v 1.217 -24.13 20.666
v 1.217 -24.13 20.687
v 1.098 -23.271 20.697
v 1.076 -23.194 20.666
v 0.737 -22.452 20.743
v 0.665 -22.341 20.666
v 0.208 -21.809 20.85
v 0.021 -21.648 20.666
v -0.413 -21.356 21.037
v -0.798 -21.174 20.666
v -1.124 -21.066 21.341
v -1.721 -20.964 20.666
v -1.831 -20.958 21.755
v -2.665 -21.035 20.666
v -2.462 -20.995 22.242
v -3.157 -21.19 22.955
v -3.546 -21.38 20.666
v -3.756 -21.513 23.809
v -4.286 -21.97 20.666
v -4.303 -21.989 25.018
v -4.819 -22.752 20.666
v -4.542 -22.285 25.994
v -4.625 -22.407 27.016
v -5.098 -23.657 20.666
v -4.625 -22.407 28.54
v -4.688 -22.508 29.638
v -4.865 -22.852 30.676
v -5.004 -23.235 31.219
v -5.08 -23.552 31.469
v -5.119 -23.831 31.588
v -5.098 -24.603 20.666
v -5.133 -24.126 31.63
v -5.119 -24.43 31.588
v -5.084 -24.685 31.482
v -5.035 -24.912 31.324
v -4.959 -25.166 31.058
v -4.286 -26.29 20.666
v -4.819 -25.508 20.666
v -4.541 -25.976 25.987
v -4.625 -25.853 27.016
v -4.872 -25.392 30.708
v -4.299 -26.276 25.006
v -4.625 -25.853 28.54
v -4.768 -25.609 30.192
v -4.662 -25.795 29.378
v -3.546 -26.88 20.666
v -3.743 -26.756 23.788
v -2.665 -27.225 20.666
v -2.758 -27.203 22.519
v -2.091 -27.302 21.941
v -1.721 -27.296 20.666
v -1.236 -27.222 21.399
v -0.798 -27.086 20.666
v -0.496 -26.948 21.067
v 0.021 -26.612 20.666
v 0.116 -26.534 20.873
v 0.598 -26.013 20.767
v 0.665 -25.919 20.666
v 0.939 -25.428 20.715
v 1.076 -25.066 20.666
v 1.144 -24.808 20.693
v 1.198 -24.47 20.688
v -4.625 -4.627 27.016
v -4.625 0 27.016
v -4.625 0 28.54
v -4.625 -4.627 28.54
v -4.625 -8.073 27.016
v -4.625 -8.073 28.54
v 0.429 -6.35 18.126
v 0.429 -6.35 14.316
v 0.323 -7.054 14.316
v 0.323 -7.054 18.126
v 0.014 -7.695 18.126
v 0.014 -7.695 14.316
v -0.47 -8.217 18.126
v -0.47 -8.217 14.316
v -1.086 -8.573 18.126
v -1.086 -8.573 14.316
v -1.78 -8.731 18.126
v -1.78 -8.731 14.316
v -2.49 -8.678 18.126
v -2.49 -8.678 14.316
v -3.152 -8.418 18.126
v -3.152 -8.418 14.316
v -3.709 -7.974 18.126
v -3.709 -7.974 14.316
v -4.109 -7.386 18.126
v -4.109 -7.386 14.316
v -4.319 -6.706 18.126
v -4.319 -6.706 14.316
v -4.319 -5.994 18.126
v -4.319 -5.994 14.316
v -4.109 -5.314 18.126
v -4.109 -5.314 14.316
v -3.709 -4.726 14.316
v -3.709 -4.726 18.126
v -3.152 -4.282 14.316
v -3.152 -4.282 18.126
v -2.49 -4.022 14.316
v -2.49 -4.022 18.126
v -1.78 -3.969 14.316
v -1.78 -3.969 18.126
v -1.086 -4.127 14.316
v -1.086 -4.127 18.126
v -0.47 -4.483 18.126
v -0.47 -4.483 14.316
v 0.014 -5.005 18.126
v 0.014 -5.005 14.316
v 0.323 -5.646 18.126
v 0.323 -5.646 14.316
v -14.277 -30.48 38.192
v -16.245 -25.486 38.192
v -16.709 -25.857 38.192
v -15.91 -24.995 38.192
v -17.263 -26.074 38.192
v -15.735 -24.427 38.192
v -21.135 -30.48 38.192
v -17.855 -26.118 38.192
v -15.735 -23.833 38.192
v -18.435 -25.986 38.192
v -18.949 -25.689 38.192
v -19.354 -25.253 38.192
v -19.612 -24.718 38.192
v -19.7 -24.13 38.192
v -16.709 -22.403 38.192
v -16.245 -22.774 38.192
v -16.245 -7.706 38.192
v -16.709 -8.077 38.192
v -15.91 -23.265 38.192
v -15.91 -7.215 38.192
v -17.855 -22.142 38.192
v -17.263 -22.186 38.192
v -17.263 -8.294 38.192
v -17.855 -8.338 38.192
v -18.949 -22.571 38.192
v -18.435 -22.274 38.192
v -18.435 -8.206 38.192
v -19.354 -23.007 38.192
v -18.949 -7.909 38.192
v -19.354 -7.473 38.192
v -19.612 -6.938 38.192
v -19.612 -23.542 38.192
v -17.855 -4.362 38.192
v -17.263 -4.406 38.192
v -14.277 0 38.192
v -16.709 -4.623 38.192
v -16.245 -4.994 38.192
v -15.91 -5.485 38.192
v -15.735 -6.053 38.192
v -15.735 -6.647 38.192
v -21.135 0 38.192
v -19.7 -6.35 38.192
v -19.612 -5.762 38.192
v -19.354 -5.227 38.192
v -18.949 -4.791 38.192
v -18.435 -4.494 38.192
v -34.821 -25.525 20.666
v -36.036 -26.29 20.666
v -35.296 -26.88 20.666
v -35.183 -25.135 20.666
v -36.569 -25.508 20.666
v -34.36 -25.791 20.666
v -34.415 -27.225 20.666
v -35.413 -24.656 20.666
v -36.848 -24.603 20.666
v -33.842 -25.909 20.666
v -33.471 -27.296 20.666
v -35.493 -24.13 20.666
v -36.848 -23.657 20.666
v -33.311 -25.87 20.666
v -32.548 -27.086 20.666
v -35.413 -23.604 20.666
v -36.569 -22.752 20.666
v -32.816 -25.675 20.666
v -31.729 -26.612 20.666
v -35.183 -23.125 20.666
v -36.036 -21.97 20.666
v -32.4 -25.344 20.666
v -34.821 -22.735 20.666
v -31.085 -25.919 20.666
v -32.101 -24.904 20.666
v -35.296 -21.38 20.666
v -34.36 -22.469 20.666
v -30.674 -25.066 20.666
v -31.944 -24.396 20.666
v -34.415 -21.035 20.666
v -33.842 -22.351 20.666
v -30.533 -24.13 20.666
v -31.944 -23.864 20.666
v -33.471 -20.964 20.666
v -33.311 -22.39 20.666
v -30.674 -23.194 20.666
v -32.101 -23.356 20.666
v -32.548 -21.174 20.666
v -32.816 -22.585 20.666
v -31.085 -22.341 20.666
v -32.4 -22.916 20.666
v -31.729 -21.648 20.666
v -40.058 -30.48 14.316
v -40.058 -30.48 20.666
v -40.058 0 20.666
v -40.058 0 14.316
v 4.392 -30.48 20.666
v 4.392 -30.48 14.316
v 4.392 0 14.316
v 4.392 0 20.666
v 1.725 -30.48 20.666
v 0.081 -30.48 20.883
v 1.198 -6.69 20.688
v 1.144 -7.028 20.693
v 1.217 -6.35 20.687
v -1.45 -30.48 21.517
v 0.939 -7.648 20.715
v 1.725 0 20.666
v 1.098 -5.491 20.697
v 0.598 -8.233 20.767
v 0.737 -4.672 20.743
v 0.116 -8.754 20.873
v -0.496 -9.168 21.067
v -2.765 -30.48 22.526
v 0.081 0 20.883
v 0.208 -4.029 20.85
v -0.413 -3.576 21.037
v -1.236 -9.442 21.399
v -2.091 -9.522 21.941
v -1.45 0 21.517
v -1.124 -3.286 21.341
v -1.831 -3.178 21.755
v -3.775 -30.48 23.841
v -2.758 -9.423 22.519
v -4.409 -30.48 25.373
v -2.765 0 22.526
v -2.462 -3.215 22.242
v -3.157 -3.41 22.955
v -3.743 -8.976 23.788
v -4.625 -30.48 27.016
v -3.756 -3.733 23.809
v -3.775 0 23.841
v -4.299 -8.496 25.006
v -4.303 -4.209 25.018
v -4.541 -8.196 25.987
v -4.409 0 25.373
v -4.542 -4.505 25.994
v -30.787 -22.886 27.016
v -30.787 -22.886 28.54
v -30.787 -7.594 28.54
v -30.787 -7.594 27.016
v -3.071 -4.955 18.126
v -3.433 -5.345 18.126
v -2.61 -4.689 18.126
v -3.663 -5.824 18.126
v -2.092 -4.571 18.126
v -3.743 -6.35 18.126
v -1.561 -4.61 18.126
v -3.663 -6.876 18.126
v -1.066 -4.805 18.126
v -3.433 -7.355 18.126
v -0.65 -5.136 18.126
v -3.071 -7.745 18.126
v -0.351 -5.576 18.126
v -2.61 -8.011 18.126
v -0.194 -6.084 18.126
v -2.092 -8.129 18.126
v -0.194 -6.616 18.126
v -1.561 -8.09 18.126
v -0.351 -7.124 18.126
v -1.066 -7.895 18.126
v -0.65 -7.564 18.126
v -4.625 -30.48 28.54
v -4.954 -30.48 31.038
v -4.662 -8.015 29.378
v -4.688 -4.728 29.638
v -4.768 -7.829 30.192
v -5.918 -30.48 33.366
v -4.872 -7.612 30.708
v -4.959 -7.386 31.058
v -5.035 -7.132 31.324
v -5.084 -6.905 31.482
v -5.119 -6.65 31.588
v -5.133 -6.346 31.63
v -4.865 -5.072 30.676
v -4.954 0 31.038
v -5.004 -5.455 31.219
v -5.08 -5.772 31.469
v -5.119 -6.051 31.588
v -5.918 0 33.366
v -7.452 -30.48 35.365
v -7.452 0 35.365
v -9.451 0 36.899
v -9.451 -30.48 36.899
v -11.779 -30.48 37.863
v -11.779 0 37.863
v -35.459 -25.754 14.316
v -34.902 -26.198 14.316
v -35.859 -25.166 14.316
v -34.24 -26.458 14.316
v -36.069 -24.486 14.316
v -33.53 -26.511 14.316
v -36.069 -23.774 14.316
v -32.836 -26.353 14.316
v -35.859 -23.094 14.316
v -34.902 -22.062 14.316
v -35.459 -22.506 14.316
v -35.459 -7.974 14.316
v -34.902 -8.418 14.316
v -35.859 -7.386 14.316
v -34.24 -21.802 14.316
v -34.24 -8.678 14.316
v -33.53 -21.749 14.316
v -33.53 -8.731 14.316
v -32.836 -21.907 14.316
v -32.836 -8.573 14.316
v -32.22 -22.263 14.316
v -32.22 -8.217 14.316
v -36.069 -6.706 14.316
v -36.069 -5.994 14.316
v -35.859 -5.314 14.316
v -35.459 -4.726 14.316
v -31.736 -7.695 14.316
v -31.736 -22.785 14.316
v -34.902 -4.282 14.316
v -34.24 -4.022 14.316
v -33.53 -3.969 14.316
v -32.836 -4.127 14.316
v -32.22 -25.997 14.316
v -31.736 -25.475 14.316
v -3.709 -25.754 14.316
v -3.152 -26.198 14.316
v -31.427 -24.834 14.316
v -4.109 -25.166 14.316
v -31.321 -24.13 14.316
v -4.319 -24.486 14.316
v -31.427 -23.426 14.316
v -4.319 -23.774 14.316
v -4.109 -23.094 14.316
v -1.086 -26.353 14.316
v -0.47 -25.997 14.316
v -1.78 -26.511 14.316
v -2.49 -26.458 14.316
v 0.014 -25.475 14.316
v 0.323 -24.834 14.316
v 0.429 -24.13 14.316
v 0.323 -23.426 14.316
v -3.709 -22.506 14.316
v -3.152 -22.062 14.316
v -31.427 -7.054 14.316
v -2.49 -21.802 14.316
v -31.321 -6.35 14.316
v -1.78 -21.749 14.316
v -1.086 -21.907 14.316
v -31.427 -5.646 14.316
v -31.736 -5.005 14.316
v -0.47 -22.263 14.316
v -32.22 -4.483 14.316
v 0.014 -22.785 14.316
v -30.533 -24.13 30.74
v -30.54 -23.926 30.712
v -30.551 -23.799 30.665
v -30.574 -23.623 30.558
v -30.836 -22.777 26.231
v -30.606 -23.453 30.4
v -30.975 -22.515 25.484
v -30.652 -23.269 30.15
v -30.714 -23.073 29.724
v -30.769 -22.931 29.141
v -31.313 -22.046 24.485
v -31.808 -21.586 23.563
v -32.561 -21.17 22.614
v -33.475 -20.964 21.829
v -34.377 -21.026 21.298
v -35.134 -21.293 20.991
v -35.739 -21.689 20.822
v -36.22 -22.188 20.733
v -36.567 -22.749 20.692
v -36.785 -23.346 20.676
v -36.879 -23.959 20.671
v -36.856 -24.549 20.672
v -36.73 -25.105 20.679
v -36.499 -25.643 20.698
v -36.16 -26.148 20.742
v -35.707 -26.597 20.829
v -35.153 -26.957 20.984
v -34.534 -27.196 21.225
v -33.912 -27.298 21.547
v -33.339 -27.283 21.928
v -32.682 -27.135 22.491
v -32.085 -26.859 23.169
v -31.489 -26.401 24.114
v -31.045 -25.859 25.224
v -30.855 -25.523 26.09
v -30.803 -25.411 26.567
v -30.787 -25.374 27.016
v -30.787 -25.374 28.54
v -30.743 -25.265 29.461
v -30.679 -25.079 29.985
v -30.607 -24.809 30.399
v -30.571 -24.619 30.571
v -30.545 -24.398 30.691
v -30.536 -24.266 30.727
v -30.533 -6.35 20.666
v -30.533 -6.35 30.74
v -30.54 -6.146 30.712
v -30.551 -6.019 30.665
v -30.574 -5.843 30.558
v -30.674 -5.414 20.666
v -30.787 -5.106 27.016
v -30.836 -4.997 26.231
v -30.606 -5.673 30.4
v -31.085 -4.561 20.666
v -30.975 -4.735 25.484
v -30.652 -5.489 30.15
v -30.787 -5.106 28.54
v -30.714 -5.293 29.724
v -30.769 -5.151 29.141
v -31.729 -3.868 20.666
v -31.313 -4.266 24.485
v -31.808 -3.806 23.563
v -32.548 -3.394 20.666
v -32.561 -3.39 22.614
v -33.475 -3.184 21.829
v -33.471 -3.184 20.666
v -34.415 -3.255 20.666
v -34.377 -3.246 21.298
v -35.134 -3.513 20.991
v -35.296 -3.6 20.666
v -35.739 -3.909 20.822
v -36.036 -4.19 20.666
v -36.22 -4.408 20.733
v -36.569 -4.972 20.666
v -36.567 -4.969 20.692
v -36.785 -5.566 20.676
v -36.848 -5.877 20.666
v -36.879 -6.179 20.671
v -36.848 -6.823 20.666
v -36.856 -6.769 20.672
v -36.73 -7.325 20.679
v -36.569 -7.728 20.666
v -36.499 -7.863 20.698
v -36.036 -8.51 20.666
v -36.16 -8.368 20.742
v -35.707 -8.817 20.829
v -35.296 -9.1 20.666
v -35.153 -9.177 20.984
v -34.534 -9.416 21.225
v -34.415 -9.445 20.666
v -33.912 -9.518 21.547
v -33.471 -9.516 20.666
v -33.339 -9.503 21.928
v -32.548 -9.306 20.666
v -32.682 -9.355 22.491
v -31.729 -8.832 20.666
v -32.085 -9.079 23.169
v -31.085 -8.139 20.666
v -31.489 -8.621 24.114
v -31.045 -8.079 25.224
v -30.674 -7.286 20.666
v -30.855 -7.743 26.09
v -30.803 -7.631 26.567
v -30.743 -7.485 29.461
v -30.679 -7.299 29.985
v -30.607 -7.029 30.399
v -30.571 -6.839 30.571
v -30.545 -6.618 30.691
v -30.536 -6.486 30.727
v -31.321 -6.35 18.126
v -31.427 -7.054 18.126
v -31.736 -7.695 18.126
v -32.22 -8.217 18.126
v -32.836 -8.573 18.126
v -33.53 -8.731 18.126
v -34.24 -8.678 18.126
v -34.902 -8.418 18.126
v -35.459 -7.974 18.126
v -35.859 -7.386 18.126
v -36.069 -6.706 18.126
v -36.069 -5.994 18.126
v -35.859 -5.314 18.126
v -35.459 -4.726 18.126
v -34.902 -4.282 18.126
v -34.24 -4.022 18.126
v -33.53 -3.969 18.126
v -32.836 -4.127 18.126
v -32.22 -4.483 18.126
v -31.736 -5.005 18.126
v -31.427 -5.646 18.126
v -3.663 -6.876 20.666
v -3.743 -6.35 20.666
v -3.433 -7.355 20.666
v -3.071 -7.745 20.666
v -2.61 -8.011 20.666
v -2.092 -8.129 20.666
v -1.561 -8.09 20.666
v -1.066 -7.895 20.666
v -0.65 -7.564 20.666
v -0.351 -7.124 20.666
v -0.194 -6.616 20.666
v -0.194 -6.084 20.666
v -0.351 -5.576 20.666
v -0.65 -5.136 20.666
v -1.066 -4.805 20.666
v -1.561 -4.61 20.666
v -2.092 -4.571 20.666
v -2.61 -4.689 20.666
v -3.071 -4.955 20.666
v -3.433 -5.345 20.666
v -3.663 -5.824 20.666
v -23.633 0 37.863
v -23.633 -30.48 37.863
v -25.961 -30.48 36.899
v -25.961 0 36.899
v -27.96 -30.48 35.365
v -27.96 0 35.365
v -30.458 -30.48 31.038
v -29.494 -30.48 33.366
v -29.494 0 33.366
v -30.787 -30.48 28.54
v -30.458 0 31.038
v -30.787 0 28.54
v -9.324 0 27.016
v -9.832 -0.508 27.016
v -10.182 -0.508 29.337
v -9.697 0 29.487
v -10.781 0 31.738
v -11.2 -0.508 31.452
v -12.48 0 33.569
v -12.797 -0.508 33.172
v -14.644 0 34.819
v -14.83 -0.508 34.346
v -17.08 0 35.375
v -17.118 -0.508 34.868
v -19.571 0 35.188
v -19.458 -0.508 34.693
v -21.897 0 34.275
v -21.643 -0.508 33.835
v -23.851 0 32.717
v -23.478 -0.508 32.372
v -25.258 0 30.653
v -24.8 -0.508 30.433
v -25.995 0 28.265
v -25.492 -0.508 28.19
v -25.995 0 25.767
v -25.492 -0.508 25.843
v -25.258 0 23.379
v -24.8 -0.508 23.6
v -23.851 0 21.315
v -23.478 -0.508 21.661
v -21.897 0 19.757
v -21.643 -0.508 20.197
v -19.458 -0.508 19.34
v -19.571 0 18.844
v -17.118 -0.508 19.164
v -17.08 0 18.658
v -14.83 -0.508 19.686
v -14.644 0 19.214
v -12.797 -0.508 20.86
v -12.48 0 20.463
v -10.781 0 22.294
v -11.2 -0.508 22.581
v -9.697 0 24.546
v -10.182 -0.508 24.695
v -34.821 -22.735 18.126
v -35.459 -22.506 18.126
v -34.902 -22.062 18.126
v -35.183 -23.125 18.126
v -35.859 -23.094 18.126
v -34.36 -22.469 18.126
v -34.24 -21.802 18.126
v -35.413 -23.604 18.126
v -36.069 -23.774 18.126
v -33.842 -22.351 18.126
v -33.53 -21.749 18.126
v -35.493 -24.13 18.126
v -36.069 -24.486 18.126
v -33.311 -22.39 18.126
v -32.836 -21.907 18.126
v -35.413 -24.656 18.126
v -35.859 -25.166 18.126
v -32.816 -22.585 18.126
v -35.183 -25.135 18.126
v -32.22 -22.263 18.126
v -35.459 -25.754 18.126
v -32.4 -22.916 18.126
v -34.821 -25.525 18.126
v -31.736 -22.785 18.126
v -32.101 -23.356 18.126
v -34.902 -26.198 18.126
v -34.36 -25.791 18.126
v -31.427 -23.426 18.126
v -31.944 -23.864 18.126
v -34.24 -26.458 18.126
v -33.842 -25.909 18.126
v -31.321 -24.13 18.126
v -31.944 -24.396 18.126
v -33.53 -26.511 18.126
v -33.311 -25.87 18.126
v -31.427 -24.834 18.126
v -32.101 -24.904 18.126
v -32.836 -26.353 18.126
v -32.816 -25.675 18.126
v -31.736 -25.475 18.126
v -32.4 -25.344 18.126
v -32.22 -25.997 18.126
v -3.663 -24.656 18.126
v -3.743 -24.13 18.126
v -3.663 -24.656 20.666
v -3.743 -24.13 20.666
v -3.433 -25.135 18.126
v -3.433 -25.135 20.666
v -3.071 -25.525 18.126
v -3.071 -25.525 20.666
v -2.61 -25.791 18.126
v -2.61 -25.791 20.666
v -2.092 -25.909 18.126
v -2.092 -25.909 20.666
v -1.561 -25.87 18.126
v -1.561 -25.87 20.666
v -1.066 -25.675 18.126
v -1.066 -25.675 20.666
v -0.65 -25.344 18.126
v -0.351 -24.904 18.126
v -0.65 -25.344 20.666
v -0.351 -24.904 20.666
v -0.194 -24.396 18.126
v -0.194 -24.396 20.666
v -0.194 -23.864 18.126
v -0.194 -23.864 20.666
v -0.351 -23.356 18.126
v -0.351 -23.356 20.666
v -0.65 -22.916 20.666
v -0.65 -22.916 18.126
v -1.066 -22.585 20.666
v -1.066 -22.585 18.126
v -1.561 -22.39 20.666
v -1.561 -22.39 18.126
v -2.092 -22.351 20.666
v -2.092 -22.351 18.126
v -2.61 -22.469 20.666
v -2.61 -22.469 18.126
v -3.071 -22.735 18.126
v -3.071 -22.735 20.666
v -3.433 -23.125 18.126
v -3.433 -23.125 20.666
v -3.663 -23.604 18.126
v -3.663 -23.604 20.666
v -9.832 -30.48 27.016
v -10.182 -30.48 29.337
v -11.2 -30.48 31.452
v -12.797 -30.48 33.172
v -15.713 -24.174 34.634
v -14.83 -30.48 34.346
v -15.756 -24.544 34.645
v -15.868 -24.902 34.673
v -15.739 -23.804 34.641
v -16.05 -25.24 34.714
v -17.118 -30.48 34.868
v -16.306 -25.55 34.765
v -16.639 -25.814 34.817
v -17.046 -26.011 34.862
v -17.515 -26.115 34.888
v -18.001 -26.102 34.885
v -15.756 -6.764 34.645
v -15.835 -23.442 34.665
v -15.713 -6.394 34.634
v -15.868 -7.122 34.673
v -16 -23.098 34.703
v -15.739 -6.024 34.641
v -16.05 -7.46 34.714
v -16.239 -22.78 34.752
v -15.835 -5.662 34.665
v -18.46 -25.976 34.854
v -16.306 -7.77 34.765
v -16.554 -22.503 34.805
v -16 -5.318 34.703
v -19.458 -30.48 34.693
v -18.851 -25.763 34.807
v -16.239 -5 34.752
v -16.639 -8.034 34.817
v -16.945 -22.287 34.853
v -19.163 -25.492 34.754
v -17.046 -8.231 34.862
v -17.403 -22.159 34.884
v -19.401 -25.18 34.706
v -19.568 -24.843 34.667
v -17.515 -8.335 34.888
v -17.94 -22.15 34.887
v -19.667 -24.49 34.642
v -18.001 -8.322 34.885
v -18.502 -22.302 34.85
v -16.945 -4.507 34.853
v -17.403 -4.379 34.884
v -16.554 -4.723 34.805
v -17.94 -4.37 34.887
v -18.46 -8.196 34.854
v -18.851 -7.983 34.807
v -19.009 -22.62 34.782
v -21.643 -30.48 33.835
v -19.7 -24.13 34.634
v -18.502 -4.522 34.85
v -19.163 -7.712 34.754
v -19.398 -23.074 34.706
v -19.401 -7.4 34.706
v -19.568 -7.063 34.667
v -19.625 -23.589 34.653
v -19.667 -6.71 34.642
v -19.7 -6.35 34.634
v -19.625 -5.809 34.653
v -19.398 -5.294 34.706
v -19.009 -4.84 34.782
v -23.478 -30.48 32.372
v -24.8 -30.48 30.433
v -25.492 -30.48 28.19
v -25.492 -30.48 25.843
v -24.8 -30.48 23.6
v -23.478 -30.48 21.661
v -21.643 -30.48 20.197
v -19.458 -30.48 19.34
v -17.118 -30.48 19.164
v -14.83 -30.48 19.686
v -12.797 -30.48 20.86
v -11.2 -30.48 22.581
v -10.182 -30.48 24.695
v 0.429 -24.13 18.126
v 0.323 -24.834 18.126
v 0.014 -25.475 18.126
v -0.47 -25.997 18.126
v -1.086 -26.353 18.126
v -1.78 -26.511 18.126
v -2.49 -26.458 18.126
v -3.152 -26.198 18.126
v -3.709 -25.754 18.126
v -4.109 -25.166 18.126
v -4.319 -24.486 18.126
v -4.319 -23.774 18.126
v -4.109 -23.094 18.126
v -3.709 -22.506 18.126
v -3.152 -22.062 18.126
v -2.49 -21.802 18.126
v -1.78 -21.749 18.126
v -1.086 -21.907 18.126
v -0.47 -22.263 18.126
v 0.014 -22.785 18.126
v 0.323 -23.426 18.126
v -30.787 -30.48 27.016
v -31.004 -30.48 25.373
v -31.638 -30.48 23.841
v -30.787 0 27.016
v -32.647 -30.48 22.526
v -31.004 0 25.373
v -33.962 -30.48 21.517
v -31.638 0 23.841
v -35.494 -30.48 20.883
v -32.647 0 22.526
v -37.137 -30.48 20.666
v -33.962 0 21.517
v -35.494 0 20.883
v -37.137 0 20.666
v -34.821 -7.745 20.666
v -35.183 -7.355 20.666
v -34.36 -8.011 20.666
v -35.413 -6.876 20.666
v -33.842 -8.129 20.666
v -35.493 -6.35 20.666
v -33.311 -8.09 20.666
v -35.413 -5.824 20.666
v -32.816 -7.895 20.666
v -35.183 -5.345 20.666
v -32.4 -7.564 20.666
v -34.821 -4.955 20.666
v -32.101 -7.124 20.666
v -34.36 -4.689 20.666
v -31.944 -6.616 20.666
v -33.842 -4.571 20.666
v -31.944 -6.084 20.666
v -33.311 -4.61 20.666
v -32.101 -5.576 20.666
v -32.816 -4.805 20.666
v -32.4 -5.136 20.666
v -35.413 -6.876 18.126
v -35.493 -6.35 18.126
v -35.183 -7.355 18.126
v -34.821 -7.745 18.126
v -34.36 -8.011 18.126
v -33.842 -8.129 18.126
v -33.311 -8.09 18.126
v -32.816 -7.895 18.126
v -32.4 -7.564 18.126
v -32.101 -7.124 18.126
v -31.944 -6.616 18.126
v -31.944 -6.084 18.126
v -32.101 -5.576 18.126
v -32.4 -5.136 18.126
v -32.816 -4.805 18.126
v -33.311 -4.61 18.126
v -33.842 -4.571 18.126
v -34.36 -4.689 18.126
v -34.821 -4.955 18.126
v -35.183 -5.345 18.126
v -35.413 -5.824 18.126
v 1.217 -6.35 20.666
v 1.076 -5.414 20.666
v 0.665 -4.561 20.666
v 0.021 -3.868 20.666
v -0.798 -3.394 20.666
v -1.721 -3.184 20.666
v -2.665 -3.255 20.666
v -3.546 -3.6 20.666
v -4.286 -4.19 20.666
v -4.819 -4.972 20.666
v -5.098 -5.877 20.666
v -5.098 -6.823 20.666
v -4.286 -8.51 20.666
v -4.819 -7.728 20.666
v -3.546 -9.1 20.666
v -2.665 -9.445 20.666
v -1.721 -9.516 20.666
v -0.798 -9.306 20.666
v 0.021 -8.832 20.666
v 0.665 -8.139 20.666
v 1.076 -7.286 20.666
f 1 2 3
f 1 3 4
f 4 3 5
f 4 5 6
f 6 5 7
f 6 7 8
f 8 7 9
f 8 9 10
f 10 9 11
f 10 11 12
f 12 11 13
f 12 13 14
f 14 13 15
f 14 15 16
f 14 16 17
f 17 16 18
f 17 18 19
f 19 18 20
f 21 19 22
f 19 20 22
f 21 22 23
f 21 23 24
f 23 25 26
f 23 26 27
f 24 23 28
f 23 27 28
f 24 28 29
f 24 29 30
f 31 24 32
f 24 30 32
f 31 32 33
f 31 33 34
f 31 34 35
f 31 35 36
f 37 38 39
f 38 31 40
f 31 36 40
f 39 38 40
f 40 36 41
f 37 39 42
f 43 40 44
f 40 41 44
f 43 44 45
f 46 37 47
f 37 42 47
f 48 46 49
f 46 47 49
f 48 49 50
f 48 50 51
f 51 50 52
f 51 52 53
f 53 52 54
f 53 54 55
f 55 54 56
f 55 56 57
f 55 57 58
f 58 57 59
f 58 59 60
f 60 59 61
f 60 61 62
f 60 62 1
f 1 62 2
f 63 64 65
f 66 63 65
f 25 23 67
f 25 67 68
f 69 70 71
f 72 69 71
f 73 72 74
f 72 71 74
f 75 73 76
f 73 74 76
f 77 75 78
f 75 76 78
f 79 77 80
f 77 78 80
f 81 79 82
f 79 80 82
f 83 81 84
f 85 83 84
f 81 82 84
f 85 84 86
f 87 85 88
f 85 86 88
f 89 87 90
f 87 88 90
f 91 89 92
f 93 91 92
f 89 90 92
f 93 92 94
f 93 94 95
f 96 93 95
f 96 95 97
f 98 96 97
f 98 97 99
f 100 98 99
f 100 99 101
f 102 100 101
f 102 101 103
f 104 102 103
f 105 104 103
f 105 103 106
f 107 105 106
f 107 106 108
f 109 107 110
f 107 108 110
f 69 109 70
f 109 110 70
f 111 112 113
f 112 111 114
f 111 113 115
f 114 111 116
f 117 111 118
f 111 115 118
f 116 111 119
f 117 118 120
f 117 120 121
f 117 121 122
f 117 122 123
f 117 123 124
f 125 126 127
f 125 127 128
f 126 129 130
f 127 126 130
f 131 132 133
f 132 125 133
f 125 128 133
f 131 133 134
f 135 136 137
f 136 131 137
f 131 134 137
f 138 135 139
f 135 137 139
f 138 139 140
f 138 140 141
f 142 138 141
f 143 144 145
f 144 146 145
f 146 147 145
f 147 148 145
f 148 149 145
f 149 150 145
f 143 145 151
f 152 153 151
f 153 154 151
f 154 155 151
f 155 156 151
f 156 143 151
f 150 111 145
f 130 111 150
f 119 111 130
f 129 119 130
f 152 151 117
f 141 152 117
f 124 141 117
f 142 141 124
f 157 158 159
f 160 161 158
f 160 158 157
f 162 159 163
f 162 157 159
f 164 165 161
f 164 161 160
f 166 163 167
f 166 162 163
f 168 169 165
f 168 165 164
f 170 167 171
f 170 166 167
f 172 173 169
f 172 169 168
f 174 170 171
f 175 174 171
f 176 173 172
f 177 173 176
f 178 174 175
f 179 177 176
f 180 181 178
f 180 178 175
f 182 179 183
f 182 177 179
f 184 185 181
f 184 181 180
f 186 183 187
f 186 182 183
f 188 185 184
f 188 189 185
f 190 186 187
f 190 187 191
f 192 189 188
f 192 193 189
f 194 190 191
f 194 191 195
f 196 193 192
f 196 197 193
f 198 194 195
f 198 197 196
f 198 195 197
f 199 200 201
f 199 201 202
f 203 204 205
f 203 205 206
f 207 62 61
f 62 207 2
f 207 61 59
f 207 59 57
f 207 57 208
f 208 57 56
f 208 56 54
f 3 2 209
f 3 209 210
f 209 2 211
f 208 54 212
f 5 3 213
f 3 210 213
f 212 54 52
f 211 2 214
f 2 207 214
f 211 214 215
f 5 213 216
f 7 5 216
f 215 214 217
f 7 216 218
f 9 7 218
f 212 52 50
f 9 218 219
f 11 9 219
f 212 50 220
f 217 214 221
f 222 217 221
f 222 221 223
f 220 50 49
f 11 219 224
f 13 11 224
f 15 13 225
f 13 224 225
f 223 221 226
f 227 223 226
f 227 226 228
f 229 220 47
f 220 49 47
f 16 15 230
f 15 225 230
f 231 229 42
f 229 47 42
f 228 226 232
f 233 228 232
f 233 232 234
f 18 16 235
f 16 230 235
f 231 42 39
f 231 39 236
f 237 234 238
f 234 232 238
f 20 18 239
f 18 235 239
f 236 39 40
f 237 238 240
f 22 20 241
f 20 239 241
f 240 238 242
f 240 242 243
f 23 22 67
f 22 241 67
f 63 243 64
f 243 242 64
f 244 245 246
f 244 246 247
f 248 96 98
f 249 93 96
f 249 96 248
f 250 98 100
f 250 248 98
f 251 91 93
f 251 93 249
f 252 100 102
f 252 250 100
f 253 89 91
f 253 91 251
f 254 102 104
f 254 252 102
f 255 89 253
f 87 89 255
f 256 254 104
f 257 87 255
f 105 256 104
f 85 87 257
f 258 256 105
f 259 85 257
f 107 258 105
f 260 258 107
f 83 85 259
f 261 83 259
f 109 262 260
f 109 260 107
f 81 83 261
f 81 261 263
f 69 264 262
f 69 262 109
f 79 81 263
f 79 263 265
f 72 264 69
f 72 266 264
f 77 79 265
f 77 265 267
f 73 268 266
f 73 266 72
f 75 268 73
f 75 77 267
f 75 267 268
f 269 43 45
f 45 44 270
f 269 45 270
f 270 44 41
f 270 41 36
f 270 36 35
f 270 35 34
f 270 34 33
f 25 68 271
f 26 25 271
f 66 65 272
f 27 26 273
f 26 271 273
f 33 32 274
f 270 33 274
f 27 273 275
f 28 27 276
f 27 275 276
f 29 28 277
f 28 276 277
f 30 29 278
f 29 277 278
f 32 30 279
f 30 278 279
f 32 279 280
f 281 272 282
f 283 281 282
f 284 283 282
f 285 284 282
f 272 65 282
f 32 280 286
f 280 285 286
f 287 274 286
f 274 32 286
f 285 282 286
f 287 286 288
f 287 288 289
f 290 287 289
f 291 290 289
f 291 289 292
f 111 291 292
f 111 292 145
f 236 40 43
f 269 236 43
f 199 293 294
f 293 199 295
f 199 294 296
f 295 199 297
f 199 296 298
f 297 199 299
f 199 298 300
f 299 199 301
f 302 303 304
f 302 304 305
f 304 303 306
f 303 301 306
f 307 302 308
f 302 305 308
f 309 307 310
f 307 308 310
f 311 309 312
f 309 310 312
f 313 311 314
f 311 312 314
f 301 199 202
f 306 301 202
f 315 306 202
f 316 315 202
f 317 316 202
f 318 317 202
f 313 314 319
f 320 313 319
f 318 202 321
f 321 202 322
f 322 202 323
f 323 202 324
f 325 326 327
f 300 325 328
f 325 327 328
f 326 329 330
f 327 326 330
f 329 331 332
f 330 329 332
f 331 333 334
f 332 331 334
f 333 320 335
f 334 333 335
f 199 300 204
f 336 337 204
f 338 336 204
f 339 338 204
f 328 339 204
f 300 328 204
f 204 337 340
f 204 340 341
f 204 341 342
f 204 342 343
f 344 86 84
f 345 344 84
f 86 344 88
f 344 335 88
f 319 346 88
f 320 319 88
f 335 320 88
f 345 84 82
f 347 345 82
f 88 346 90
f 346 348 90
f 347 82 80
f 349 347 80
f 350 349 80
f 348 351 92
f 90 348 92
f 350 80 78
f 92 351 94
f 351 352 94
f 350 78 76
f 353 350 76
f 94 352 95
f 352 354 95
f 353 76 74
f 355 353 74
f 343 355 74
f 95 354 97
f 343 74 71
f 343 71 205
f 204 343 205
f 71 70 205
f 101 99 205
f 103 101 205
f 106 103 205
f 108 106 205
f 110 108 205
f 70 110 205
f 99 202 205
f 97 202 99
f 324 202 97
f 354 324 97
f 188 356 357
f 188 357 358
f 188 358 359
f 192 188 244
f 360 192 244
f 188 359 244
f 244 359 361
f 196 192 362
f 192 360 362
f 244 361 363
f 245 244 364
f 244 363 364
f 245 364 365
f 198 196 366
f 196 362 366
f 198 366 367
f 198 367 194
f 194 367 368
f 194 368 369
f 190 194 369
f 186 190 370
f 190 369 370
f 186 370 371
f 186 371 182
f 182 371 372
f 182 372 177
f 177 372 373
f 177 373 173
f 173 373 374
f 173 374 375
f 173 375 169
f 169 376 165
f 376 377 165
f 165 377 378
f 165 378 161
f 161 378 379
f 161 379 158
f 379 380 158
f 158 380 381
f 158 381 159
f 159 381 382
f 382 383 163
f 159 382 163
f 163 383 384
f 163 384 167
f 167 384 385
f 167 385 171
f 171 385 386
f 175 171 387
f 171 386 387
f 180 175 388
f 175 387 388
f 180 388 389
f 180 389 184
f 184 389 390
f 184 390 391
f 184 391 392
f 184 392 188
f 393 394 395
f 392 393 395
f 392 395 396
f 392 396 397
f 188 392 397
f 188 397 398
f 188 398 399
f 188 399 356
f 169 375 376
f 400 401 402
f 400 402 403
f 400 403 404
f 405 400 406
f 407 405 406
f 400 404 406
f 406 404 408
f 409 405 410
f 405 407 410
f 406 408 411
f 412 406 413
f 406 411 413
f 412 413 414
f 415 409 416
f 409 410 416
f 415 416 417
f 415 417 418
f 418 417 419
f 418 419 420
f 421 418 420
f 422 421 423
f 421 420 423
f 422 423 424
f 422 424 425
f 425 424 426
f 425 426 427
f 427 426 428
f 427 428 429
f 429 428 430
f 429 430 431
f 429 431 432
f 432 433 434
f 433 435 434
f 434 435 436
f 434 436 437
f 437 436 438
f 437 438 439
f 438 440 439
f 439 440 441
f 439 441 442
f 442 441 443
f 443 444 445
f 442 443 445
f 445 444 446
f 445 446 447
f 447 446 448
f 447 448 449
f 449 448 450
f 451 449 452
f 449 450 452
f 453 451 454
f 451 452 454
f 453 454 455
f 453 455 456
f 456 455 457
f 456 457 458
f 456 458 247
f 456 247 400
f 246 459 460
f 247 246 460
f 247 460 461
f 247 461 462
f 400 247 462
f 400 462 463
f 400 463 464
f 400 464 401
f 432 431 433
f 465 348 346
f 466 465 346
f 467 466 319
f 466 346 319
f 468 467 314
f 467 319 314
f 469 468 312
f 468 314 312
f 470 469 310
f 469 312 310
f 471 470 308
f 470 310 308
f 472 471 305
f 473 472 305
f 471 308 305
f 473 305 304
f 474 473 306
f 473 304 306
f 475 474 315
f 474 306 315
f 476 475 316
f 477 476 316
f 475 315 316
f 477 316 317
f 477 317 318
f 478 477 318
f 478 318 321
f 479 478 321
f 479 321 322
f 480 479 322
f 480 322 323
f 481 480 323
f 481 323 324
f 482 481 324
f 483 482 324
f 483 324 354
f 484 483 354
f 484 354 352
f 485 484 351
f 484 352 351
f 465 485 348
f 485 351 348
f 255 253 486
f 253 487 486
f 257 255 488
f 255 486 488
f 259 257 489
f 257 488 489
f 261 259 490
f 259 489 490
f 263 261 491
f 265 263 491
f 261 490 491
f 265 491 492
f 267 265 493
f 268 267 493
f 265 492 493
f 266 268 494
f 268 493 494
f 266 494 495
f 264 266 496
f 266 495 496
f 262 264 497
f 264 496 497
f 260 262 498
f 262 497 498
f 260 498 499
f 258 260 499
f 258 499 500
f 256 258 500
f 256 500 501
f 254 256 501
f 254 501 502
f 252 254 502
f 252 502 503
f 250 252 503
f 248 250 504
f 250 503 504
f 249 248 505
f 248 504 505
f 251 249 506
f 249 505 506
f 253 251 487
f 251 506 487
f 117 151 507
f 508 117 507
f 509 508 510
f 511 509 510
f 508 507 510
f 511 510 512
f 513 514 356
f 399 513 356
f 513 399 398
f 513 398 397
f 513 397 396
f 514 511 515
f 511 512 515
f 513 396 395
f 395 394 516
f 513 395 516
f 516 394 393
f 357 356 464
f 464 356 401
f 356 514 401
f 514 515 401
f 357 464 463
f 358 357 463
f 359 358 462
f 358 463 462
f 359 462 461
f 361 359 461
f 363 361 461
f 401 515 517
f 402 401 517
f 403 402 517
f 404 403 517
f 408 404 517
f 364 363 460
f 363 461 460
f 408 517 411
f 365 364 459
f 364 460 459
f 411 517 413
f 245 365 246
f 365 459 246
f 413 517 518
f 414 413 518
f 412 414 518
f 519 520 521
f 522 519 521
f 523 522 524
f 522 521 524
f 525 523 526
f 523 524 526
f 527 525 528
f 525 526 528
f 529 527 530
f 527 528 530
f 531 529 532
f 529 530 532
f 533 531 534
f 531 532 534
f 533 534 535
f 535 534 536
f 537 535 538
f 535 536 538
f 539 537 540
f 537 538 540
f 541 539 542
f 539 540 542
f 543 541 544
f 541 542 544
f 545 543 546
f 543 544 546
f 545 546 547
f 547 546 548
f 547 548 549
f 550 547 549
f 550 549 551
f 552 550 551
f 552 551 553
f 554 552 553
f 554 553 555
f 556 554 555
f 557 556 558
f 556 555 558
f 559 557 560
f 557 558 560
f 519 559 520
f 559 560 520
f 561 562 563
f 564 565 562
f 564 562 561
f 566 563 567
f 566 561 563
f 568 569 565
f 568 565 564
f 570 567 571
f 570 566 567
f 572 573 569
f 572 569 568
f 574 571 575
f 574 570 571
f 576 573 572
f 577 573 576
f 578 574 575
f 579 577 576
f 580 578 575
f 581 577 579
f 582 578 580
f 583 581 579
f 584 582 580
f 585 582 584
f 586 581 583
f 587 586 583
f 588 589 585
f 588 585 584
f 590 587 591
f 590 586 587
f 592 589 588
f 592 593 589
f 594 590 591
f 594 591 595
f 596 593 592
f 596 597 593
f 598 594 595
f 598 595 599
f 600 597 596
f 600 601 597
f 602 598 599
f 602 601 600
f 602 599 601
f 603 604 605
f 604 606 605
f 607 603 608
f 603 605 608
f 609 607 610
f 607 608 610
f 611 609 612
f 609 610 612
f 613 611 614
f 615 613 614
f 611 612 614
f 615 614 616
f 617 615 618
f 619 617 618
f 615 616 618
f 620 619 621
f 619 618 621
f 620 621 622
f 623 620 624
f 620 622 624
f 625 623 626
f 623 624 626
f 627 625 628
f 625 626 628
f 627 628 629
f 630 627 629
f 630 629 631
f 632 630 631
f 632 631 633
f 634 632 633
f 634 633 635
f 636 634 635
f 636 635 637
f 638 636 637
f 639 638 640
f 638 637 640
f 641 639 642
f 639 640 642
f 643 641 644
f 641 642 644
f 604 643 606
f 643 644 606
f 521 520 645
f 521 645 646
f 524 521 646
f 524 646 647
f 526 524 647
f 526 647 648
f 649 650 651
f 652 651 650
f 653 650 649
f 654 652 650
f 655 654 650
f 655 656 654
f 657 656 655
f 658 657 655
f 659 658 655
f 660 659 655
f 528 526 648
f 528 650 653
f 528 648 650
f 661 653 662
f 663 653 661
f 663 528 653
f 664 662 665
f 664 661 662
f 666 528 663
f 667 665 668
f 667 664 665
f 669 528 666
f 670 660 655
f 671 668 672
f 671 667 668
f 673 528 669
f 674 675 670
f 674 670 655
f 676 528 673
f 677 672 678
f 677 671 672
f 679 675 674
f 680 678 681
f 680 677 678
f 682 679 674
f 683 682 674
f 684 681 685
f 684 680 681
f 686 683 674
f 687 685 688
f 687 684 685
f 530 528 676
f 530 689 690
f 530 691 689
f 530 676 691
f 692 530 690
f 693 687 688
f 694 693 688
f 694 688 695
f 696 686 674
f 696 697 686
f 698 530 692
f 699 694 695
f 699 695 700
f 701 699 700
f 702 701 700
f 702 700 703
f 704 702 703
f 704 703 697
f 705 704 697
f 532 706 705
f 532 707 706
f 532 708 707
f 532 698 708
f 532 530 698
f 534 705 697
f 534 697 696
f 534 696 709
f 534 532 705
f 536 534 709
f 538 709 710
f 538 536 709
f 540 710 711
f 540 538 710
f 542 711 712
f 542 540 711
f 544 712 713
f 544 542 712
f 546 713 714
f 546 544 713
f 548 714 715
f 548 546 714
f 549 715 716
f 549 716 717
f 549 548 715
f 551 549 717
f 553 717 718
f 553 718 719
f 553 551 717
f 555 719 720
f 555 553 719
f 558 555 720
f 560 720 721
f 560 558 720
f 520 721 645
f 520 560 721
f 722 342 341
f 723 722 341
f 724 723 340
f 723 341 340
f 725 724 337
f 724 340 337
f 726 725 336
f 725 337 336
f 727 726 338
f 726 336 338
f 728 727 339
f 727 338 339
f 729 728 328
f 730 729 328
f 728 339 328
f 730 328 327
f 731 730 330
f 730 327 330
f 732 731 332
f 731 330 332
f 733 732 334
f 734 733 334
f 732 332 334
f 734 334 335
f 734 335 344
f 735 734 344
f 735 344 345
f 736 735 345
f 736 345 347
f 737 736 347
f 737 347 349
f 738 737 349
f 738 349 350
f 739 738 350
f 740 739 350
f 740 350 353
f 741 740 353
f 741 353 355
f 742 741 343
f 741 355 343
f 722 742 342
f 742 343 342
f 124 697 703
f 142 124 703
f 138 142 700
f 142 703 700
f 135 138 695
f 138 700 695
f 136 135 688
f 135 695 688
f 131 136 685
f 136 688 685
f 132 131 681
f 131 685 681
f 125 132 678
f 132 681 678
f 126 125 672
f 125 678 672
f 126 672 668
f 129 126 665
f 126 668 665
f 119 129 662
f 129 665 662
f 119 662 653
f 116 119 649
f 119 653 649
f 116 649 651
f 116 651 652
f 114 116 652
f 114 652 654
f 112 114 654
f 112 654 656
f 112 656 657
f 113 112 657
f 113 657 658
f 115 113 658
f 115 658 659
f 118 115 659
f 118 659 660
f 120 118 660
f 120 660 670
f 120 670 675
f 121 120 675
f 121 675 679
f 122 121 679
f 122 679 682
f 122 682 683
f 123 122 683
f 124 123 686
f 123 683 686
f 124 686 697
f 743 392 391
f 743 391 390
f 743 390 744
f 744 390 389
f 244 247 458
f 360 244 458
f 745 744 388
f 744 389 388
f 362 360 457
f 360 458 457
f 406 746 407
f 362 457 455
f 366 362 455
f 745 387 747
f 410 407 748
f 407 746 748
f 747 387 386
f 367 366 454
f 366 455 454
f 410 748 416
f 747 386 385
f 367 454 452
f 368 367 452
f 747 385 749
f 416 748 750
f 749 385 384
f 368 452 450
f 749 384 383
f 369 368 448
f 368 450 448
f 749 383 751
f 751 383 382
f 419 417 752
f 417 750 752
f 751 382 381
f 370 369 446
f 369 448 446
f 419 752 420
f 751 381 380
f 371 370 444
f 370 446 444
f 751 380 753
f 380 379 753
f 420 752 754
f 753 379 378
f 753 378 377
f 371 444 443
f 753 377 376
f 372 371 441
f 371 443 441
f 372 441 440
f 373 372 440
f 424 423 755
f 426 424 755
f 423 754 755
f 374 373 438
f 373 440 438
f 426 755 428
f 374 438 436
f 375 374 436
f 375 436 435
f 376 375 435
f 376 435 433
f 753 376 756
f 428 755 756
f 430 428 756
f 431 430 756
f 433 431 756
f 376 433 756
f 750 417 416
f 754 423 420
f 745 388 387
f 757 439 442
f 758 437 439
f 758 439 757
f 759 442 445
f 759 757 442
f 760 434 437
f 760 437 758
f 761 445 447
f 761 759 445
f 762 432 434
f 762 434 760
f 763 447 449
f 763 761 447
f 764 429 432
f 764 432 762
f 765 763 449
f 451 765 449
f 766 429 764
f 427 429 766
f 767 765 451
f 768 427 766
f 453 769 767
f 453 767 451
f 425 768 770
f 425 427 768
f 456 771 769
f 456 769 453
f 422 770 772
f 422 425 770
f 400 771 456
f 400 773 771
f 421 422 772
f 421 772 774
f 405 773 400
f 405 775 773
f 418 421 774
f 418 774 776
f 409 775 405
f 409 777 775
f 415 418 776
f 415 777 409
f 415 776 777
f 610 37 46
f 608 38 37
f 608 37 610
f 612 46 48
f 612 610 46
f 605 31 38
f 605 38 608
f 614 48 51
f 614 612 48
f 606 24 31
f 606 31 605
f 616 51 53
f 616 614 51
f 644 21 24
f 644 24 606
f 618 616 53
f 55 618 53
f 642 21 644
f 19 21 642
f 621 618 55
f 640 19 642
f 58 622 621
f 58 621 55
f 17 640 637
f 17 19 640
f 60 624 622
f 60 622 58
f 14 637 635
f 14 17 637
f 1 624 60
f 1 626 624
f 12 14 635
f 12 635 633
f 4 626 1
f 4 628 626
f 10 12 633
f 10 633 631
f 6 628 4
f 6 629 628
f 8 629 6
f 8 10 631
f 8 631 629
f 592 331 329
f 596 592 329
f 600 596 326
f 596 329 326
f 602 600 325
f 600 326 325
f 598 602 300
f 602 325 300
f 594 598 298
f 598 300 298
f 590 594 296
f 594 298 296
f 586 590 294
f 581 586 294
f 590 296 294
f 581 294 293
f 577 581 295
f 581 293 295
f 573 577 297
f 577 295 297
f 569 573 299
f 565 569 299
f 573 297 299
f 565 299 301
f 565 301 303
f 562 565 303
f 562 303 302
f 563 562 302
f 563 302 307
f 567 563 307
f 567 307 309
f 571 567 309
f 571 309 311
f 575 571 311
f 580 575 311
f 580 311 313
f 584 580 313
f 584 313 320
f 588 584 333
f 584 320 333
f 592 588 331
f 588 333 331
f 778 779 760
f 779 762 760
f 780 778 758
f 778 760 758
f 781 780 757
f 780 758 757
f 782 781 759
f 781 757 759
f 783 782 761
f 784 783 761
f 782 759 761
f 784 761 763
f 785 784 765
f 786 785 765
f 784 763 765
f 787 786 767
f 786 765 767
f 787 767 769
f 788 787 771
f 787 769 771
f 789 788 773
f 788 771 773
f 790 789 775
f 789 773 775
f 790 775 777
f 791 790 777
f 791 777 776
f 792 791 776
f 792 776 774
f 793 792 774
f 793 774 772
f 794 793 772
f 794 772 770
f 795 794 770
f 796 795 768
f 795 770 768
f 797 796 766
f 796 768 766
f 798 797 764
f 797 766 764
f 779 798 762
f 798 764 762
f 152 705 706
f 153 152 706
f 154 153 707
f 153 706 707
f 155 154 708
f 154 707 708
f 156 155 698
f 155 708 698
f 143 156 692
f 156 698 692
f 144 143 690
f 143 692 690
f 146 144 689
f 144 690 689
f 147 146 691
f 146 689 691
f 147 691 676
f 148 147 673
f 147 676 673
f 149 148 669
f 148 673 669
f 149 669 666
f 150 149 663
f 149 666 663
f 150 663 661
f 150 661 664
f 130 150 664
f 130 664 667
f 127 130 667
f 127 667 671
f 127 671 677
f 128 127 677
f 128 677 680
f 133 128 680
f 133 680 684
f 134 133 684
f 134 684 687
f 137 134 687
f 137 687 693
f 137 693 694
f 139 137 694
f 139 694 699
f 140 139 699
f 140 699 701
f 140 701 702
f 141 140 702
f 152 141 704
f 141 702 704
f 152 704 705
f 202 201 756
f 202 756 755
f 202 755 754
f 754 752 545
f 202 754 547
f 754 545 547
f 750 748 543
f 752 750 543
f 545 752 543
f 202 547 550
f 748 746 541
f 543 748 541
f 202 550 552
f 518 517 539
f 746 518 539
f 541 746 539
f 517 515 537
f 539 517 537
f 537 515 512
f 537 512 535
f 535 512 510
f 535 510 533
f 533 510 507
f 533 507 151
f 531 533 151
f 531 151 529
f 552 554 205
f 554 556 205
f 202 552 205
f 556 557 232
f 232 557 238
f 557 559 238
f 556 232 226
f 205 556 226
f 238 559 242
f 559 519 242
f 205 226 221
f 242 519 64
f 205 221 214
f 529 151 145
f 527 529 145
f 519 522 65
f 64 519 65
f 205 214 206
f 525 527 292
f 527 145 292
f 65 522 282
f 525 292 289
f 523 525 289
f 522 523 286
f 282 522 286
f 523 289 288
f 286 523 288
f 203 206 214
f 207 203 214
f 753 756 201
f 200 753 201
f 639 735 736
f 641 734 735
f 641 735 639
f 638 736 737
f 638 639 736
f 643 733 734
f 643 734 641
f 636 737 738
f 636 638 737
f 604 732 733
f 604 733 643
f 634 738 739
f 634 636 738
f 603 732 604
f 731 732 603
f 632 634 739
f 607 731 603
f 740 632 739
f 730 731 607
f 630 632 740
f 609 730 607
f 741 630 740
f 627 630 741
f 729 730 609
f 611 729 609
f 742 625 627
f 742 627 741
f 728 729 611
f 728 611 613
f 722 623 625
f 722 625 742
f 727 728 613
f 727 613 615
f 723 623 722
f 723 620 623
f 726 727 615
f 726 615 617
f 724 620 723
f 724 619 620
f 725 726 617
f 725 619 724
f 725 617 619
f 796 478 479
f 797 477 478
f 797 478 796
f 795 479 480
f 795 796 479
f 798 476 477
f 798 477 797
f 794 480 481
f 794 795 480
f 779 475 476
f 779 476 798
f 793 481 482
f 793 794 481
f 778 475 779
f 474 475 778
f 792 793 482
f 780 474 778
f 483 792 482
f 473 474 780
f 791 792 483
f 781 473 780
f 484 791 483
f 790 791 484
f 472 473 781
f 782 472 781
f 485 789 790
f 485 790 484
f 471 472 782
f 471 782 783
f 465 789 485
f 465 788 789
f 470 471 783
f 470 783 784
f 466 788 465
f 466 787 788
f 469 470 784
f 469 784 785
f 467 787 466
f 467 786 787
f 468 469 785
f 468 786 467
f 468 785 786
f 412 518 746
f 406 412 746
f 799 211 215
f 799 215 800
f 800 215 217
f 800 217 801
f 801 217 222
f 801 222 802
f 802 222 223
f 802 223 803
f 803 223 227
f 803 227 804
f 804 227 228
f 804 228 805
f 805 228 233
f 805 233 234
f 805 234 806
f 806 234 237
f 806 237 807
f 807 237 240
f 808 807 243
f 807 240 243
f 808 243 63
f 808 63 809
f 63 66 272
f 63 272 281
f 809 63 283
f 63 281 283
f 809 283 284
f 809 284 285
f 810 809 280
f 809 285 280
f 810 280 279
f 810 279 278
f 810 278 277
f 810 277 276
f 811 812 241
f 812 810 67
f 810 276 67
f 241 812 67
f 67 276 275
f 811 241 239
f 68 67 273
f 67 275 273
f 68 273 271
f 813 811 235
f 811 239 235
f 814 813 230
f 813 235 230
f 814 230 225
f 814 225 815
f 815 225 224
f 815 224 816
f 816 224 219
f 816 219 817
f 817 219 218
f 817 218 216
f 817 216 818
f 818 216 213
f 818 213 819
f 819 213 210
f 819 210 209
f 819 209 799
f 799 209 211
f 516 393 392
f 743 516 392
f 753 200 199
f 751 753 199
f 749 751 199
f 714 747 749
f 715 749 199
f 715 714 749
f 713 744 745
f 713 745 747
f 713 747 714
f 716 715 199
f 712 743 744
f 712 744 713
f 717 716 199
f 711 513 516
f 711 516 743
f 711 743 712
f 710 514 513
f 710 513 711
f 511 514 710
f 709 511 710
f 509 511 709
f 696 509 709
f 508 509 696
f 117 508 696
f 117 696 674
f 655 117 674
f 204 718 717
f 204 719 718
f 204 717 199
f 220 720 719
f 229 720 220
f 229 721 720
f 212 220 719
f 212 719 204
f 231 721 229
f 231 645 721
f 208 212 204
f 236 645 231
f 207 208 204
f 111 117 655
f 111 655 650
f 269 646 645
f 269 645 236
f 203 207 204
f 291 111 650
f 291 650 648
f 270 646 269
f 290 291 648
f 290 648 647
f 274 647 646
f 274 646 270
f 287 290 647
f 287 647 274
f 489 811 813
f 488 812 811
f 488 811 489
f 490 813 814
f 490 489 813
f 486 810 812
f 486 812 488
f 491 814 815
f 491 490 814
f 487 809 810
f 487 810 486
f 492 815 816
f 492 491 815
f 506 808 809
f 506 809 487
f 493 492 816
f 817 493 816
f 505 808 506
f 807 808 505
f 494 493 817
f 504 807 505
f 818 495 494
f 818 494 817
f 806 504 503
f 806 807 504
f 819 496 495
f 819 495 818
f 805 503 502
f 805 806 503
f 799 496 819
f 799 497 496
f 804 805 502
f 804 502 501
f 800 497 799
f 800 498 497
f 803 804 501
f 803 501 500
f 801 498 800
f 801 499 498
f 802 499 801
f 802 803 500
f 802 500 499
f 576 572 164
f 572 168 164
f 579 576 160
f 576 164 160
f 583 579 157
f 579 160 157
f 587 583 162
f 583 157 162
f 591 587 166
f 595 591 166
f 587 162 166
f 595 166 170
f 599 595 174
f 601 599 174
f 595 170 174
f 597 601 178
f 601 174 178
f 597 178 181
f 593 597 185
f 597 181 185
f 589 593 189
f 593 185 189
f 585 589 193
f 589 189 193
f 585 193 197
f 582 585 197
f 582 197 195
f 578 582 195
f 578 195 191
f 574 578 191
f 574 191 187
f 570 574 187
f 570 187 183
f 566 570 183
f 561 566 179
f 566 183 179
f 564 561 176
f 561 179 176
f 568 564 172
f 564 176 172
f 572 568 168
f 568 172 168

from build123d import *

# Parameters (mm, degrees)
F0_R      = 7.874
F1_DEPTH  = 30.48
F3_D      = 3.5687
F2_R      = 2.3876
F4_DEPTH  = 3.81
F6_R      = 3.175
F7_DEPTH  = 12.7
F9_D      = 3.9878
F9_DEPTH  = 6.35
F9_TIP    = 1.1980559883
F10_SIZE2 = 0.508
F10_SIZE  = 0.508


with BuildPart() as f1:
    # F0 (on Front) → F1 (new body)
    with BuildSketch(Plane.XZ):
        with BuildLine():
            Line((-40.0582700968, 20.666185411), (-40.0582700968, 14.3161859534))
            Line((-40.0582700968, 14.3161859534), (4.3917299032, 14.3161859534))
            Line((4.3917299032, 14.3161859534), (4.3917299032, 20.666185411))
            Line((4.3917299032, 20.666185411), (1.7247299032, 20.666185411))
            ThreePointArc((1.7247299032, 20.666185411), (-2.7653981573, 22.5260573505), (-4.6252700968, 27.016185411))
            Line((-4.6252700968, 27.016185411), (-4.6252700968, 28.5401859534))
            ThreePointArc((-4.6252700968, 28.5401859534), (-7.4522754448, 35.3651806054), (-14.2772700968, 38.1921859534))
            Line((-14.2772700968, 38.1921859534), (-21.1352700968, 38.1921859534))
            ThreePointArc((-21.1352700968, 38.1921859534), (-27.9602647488, 35.3651806054), (-30.7872700968, 28.5401859534))
            Line((-30.7872700968, 28.5401859534), (-30.7872700968, 27.016185411))
            ThreePointArc((-30.7872700968, 27.016185411), (-32.6471420362, 22.5260573505), (-37.1372700968, 20.666185411))
            Line((-37.1372700968, 20.666185411), (-40.0582700968, 20.666185411))
        make_face()
        with Locations((-17.7062700968, 27.0161859534)):
            Circle(F0_R, mode=Mode.SUBTRACT)
    extrude(amount=F1_DEPTH)

    # F3 (through all)
    with Locations(Plane(origin=(0, 0, 14.3161859534), x_dir=(1, 0, 0), z_dir=(0, 0, -1))):
        with Locations((-33.7082700968, 24.13), (-33.7082700968, 6.35), (-1.9582700968, 24.13), (-1.9582700968, 6.35)):
            Hole(F3_D / 2)

    # F2 (on face) → F4 (cut)
    with BuildSketch(Plane(origin=(0, 0, 14.3161859534), x_dir=(1, 0, 0), z_dir=(0, 0, -1))):
        with Locations((-33.7082700968, 24.13)):
            Circle(F2_R)
        with Locations((-1.9582700968, 6.35)):
            Circle(F2_R)
        with Locations((-33.7082700968, 6.35)):
            Circle(F2_R)
        with Locations((-1.9582700968, 24.13)):
            Circle(F2_R)
    extrude(amount=-F4_DEPTH, mode=Mode.SUBTRACT)

    # F6 (on offset) → F7 (cut)
    with BuildSketch(Plane.XY.offset(33.366185411)):
        with Locations((-33.7082700968, -6.35)):
            Circle(F6_R)
        with Locations((-33.7082700968, -24.13)):
            Circle(F6_R)
        with Locations((-1.9582700968, -6.35)):
            Circle(F6_R)
        with Locations((-1.9582700968, -24.13)):
            Circle(F6_R)
    extrude(amount=-F7_DEPTH, mode=Mode.SUBTRACT)

    # F9
    with Locations(Plane.XY.offset(38.1921859534)):
        with Locations((-17.7062700968, -6.35), (-17.7062700968, -24.13)):
            Hole(F9_D / 2, depth=F9_DEPTH)
            with Locations((0, 0, -(F9_DEPTH + F9_TIP / 2))):  # 118° drill point
                Cone(0, F9_D / 2, F9_TIP, mode=Mode.SUBTRACT)

    # F10
    f10_edges = [f1.edges().sort_by_distance(p)[0] for p in [
        (-25.58027, 0, 27.016186),
    ]]
    chamfer(f10_edges, length=F10_SIZE, length2=F10_SIZE2)


solid = f1.part
